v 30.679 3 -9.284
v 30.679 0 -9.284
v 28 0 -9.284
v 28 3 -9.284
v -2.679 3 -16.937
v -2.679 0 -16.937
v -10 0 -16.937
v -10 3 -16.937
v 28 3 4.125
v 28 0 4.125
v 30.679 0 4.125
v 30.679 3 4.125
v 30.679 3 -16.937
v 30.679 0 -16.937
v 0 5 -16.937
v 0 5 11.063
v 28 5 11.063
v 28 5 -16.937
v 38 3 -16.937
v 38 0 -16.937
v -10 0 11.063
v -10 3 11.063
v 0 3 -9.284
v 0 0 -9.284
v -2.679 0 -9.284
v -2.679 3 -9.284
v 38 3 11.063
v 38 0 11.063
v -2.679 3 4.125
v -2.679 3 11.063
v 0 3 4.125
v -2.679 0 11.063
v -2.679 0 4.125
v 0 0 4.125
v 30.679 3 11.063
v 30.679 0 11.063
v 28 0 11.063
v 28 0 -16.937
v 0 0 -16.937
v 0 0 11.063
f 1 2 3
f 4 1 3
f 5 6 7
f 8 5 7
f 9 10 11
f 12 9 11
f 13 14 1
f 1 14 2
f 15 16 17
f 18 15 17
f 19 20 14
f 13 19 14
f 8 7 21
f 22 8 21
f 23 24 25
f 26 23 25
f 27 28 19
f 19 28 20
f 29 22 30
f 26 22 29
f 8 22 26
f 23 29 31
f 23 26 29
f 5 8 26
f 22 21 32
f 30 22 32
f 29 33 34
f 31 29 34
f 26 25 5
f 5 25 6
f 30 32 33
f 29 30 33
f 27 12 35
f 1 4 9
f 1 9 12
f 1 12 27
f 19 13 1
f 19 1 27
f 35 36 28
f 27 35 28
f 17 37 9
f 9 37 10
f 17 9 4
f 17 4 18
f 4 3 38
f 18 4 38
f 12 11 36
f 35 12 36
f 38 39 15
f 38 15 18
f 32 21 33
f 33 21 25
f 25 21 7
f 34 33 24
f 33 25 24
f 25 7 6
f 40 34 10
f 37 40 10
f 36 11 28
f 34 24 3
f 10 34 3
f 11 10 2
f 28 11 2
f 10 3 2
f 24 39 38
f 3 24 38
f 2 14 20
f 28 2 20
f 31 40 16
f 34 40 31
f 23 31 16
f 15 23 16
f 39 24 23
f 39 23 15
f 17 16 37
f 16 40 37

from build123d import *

# Parameters (mm, degrees)
EXTRUDE_1_DEPTH = 3
SKETCH_3_W      = 28
SKETCH_3_H      = 28
EXTRUDE_2_DEPTH = 1
SKETCH_4_W      = 28
SKETCH_4_H      = 28
EXTRUDE_3_DEPTH = 1


with BuildPart() as part:
    # 草图2 → 凸台-拉伸1 (new body)
    with BuildSketch(Plane(origin=(0, 0, 0), x_dir=(1, 0, 0), z_dir=(0, 1, 0))):
        Polygon((0, 9.283892138), (-2.678979425, 9.283892138), (-2.678979425, 16.936687797), (-10, 16.936687797), (-10, -11.063312203), (-2.678979425, -11.063312203), (-2.678979425, -4.12513502), (0, -4.12513502), (0, -11.063312203), (28, -11.063312203), (28, -4.12513502), (30.678979425, -4.12513502), (30.678979425, -11.063312203), (38, -11.063312203), (38, 16.936687797), (30.678979425, 16.936687797), (30.678979425, 9.283892138), (28, 9.283892138), (28, 16.936687797), (0, 16.936687797), align=None)
    extrude(amount=EXTRUDE_1_DEPTH)

    # 草图3 → 凸台-拉伸2 (add)
    with BuildSketch(Plane(origin=(0, 3, 0), x_dir=(1, 0, 0), z_dir=(0, 1, 0))):
        with Locations((14, 2.936687797)):
            Rectangle(SKETCH_3_W, SKETCH_3_H)
    extrude(amount=EXTRUDE_2_DEPTH)

    # 草图4 → 凸台-拉伸3 (add)
    with BuildSketch(Plane(origin=(0, 4, 0), x_dir=(1, 0, 0), z_dir=(0, 1, 0))):
        with Locations((14, 2.936687797)):
            Rectangle(SKETCH_4_W, SKETCH_4_H)
    extrude(amount=EXTRUDE_3_DEPTH)


solid = part.part
